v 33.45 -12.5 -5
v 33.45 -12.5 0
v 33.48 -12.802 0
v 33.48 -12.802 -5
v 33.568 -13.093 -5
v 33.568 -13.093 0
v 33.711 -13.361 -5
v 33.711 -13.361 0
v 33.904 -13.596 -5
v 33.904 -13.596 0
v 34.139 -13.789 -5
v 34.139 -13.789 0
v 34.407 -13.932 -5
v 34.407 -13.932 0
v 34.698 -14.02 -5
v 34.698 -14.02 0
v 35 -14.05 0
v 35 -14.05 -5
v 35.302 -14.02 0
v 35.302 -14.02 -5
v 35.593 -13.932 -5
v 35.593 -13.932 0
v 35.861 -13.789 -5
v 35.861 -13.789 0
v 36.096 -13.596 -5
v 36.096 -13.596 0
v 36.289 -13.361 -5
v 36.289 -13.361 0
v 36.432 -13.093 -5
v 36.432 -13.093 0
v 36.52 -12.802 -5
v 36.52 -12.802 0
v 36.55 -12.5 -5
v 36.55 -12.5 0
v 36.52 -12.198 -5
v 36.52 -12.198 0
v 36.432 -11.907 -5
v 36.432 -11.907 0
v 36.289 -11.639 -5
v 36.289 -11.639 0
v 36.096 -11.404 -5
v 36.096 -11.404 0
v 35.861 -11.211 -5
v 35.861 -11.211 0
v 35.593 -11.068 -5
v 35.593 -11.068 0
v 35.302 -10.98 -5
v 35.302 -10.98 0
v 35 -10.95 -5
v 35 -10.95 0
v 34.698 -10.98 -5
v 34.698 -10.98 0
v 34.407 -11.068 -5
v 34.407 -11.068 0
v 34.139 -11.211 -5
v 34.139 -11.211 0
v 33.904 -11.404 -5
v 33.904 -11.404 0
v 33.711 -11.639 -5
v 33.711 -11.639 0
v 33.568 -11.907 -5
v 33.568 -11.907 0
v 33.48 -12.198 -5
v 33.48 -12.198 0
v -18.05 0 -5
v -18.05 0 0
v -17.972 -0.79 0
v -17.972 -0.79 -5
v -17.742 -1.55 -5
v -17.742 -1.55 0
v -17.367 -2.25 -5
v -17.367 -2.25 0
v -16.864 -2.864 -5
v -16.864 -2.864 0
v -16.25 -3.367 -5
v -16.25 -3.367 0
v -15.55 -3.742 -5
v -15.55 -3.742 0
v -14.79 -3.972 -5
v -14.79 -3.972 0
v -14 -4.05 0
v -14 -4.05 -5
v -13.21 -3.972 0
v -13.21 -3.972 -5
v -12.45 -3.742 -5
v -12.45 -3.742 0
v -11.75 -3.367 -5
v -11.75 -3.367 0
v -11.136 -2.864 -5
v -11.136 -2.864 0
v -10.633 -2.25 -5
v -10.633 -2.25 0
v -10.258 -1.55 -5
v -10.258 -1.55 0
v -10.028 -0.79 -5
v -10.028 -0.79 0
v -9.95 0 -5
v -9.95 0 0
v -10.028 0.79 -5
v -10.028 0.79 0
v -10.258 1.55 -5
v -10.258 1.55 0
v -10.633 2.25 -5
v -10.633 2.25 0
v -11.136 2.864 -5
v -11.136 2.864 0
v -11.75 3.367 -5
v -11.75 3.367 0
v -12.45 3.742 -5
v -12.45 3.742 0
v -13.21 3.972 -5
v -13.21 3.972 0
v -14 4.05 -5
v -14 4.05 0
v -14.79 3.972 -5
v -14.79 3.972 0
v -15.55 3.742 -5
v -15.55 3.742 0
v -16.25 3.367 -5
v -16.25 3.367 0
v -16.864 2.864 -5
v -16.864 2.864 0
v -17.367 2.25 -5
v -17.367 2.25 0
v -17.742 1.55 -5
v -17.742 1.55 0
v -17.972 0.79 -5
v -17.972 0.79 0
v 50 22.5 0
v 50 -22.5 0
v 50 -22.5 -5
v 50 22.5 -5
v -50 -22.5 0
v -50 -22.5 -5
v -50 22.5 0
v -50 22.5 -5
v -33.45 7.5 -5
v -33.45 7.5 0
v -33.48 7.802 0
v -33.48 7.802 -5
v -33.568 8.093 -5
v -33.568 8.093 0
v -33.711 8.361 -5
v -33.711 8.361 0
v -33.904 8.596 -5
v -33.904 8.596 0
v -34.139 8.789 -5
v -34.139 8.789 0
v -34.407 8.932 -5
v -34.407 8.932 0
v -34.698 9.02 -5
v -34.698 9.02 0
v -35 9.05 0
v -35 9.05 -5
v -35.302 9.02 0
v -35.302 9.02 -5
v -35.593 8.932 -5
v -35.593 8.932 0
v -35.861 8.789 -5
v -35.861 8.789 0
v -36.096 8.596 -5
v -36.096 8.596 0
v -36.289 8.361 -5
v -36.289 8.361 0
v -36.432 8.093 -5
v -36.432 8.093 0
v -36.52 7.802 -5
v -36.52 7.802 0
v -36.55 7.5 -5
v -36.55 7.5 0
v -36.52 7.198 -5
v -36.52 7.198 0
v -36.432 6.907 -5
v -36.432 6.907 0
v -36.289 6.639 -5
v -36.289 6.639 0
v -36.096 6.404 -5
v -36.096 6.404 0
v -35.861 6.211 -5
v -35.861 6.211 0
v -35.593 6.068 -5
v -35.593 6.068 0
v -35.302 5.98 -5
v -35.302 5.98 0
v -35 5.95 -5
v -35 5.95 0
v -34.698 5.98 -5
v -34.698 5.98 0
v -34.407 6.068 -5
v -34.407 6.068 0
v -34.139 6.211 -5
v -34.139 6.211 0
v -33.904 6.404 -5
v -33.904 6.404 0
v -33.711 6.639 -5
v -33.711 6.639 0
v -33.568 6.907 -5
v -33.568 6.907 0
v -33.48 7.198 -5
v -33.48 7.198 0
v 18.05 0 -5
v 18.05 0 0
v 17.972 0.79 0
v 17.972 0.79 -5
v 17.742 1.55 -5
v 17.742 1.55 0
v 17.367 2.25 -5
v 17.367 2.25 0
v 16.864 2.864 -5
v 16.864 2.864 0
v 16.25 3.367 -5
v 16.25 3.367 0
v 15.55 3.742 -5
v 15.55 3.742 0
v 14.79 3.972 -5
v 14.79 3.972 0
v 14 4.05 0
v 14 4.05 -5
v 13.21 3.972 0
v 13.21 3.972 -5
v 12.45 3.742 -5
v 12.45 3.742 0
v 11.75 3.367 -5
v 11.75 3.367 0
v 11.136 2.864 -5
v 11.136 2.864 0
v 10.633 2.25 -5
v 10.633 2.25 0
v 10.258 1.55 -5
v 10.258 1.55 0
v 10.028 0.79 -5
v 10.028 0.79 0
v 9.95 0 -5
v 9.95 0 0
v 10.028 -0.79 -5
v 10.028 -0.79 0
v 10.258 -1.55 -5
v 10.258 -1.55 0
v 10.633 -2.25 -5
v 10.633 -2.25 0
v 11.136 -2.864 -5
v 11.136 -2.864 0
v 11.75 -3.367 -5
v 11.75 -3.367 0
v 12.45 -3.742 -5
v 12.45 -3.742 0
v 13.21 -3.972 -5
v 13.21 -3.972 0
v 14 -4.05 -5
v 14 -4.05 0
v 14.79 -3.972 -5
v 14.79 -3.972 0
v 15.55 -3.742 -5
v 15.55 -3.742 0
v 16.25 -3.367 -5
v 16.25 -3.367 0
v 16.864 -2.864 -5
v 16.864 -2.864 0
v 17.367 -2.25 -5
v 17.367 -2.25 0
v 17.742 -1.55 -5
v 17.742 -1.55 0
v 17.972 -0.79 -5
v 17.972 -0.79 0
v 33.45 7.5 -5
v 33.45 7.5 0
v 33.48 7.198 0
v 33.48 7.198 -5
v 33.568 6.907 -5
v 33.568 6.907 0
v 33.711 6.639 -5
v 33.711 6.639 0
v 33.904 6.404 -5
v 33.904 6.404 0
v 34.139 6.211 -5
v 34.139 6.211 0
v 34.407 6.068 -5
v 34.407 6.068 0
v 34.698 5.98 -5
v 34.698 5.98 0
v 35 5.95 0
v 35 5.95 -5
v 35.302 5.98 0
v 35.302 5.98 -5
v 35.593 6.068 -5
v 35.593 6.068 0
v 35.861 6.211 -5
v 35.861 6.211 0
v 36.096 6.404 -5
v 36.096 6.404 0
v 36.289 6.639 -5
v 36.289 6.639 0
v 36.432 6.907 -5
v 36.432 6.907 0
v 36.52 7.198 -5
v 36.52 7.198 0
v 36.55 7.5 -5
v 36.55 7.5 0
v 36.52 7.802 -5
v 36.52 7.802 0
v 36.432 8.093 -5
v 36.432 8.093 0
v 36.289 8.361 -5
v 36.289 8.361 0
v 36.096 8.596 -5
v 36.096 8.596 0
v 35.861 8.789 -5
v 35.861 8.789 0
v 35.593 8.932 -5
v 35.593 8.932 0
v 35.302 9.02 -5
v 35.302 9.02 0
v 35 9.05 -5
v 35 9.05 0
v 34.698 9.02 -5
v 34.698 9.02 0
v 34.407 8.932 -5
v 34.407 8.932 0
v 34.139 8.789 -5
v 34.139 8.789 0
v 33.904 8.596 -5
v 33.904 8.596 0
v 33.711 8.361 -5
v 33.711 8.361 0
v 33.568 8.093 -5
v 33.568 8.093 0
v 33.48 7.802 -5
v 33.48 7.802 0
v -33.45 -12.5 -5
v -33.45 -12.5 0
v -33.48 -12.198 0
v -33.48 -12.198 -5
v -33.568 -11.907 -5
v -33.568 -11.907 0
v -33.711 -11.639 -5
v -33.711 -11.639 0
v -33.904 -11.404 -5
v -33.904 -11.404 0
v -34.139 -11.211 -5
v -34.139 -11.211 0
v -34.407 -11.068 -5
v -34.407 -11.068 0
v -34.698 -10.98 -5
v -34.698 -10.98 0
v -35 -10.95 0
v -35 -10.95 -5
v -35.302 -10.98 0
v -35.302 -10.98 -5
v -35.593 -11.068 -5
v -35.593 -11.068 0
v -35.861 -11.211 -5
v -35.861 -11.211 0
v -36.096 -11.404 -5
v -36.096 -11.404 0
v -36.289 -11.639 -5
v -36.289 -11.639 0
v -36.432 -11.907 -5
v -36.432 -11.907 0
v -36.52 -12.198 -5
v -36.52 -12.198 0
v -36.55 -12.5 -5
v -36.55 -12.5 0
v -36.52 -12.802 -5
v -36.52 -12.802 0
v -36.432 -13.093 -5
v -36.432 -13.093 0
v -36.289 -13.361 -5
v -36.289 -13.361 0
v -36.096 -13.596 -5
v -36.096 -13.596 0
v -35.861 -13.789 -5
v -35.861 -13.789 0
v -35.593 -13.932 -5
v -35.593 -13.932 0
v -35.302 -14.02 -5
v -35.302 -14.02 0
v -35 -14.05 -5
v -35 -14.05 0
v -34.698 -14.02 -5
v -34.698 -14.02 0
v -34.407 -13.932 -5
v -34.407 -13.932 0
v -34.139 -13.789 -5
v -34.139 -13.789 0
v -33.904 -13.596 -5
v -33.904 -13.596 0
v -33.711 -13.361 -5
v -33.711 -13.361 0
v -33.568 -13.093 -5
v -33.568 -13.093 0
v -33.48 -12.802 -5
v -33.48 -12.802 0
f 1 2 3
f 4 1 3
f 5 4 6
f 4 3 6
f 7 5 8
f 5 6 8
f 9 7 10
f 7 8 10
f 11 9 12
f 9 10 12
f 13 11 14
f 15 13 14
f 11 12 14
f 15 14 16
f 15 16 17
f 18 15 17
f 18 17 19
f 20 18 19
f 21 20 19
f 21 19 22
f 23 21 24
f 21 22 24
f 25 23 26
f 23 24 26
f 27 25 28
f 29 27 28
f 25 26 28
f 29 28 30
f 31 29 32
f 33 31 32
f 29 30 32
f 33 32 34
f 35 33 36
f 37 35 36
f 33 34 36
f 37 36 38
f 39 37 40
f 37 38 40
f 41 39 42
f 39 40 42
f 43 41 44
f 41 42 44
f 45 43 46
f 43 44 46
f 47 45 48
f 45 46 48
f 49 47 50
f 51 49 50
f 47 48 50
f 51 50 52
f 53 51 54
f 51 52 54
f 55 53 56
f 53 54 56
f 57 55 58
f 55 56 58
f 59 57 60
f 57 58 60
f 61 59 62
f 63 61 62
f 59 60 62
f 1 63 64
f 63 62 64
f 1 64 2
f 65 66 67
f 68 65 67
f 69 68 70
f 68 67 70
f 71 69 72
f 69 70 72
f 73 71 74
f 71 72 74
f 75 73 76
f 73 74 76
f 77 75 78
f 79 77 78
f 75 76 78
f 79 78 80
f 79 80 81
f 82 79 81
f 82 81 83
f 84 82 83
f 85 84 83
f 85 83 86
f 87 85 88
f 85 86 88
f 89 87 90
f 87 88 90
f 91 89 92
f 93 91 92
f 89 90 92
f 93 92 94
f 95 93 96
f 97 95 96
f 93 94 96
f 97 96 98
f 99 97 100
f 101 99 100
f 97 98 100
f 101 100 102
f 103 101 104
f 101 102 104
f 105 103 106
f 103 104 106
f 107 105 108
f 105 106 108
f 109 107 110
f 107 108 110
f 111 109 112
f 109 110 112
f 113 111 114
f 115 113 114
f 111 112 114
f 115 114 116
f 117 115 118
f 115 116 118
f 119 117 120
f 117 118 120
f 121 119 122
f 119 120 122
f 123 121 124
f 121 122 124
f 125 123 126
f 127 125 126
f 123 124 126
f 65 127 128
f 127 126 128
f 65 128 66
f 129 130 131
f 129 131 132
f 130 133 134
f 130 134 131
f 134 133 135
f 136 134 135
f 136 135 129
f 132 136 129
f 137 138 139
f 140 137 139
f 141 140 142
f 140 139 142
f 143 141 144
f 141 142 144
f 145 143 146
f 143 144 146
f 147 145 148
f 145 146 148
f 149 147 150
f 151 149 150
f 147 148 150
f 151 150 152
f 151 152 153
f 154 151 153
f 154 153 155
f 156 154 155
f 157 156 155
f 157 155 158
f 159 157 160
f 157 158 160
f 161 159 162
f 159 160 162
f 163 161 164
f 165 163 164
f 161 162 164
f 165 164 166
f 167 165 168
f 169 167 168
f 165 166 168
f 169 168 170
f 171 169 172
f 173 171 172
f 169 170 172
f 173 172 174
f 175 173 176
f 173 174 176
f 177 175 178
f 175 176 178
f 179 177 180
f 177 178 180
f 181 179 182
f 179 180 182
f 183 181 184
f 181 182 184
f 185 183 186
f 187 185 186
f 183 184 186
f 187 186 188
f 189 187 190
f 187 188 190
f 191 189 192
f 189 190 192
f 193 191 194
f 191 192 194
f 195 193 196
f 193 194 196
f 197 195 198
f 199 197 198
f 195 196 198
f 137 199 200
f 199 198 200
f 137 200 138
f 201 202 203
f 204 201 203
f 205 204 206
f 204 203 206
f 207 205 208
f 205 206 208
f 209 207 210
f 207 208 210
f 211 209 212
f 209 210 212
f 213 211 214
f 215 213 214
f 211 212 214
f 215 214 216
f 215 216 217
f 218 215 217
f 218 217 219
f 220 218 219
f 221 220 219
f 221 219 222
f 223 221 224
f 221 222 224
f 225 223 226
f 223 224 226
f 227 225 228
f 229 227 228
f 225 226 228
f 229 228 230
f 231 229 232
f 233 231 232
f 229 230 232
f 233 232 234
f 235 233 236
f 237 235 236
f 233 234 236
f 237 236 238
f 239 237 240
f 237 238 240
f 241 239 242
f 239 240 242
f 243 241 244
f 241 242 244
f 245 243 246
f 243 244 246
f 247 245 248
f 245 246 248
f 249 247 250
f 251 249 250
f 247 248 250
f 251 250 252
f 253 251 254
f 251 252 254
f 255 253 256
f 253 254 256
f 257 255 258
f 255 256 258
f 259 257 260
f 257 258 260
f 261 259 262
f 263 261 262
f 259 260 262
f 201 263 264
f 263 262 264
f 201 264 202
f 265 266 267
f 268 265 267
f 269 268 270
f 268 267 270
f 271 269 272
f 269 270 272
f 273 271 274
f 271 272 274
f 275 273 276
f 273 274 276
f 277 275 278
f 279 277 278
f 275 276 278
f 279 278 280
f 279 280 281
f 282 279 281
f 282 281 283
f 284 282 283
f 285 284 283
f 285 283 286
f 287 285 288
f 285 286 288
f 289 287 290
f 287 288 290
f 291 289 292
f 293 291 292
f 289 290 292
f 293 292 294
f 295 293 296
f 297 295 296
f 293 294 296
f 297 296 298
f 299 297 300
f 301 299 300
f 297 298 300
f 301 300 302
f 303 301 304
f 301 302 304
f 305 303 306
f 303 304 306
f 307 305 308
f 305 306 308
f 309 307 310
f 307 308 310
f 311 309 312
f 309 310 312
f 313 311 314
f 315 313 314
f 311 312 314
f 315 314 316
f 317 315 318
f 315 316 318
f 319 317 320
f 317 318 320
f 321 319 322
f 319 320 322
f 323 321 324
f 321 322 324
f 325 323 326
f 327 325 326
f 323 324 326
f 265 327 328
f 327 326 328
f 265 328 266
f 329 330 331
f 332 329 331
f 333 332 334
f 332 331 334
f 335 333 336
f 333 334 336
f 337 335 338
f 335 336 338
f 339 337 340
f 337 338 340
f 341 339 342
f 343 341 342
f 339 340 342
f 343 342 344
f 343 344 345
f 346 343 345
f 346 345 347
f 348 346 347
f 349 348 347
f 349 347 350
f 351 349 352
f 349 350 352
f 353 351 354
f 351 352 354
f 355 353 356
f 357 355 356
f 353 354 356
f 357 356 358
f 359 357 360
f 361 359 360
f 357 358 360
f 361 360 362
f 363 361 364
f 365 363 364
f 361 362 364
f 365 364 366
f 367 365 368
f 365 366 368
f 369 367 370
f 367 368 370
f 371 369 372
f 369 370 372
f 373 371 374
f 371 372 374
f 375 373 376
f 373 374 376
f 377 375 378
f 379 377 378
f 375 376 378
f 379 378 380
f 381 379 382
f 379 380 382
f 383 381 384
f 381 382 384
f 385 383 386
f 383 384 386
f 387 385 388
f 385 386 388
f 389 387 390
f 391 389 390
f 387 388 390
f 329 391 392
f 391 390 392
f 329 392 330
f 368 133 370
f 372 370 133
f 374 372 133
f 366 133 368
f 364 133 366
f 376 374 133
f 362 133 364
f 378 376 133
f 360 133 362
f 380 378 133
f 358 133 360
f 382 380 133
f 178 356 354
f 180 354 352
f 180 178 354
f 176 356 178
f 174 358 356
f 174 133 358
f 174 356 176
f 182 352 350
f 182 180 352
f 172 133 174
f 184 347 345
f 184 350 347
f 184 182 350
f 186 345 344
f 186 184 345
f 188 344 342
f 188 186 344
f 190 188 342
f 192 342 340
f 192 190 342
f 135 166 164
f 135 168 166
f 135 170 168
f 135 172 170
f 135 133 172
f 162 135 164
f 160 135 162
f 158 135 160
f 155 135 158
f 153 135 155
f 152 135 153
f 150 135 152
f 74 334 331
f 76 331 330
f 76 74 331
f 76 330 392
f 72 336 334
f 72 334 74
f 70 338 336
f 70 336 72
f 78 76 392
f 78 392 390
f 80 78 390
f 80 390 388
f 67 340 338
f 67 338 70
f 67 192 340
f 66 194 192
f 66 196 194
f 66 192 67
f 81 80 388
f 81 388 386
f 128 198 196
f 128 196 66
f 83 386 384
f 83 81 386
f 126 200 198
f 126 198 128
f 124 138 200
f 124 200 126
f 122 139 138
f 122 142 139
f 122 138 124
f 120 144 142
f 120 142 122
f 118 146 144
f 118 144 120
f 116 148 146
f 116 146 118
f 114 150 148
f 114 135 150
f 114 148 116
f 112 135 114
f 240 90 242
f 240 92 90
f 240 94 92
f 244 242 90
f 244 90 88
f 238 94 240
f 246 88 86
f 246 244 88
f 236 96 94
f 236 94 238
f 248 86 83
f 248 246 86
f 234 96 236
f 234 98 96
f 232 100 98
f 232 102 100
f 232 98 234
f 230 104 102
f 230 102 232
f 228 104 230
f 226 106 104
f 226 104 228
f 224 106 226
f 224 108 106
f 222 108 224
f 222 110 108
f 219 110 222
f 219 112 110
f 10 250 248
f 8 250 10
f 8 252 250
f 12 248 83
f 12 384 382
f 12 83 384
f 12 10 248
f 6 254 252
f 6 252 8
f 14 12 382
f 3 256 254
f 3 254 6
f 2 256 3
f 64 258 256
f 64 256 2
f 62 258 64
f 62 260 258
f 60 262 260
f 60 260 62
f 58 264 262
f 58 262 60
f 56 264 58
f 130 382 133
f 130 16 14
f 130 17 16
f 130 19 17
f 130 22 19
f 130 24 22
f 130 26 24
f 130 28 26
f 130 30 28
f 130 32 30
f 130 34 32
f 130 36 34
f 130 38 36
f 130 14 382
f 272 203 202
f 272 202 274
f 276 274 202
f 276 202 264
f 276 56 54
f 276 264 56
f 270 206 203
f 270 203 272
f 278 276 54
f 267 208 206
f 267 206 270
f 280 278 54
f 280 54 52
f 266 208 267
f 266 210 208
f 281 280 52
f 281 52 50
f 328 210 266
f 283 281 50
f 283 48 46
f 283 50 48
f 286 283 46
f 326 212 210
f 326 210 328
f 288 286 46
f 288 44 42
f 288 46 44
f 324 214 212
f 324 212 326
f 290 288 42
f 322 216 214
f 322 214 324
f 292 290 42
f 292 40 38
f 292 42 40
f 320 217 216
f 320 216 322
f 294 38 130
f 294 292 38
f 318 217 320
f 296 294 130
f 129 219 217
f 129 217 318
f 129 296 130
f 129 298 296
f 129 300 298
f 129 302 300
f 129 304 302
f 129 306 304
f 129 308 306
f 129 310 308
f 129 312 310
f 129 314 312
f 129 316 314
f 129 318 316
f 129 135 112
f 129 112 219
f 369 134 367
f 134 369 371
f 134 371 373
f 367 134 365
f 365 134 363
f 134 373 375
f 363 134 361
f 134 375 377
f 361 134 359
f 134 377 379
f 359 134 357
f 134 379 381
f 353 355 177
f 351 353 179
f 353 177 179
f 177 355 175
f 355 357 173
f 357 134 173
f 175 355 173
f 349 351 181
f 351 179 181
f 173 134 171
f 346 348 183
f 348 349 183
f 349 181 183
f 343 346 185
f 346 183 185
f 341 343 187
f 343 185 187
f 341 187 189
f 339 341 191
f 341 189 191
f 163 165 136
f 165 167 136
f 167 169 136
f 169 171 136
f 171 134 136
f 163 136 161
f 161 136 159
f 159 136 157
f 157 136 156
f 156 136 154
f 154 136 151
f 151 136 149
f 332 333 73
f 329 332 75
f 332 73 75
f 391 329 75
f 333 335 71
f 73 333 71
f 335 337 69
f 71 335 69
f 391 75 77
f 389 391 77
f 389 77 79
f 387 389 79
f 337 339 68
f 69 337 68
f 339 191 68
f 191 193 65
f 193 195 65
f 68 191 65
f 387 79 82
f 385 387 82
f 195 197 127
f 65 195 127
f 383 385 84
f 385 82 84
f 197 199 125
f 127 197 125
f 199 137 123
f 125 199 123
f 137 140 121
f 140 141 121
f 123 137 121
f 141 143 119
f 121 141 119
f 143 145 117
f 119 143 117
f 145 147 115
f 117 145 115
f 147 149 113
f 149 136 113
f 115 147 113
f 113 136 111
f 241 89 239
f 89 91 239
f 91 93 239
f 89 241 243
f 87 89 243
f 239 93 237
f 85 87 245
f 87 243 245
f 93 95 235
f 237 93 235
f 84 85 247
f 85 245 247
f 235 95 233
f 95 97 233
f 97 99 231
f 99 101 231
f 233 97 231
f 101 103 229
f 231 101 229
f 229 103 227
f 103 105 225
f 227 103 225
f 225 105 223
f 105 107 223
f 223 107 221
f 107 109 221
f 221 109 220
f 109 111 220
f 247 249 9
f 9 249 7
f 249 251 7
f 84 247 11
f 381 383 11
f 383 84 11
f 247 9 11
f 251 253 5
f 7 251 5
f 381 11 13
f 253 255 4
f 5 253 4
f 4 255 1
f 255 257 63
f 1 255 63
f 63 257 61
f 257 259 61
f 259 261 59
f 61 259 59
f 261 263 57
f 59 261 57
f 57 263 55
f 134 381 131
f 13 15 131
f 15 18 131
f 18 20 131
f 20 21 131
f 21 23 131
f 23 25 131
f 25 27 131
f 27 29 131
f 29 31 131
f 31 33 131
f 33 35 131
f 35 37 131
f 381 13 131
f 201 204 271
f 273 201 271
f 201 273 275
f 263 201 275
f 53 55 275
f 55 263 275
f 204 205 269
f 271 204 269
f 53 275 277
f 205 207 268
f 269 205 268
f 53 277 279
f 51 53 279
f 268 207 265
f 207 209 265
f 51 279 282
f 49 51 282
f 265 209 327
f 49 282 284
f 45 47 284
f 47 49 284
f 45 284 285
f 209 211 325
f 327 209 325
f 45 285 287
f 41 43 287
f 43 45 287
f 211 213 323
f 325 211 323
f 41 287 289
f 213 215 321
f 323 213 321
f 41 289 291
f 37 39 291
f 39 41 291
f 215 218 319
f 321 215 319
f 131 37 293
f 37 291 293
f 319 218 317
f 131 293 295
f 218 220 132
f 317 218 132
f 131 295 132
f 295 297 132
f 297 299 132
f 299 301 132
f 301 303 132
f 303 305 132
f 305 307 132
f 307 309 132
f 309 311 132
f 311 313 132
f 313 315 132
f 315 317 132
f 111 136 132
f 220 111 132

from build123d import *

# Parameters (mm, degrees)
ESQUISSE1_W        = 100
ESQUISSE1_H        = 45
ESQUISSE1_R        = 1.55
ESQUISSE1_R_2      = 4.05
BOSS_EXTRU_1_DEPTH = 5


with BuildPart() as part:
    # Esquisse1 → Boss.-Extru.1 (new body)
    with BuildSketch(Plane.XY):
        Rectangle(ESQUISSE1_W, ESQUISSE1_H)
        with Locations((-35, -12.5)):
            Circle(ESQUISSE1_R, mode=Mode.SUBTRACT)
        with Locations(Location((35, -12.5, 0), (0, 0, 180))):
            Circle(ESQUISSE1_R, mode=Mode.SUBTRACT)
        with Locations((14, 0)):
            Circle(ESQUISSE1_R_2, mode=Mode.SUBTRACT)
        with Locations(Location((-14, 0, 0), (0, 0, 180))):
            Circle(ESQUISSE1_R_2, mode=Mode.SUBTRACT)
        with Locations((-35, 7.5)):
            Circle(ESQUISSE1_R, mode=Mode.SUBTRACT)
        with Locations(Location((35, 7.5, 0), (0, 0, 180))):
            Circle(ESQUISSE1_R, mode=Mode.SUBTRACT)
    extrude(amount=-BOSS_EXTRU_1_DEPTH)


solid = part.part
